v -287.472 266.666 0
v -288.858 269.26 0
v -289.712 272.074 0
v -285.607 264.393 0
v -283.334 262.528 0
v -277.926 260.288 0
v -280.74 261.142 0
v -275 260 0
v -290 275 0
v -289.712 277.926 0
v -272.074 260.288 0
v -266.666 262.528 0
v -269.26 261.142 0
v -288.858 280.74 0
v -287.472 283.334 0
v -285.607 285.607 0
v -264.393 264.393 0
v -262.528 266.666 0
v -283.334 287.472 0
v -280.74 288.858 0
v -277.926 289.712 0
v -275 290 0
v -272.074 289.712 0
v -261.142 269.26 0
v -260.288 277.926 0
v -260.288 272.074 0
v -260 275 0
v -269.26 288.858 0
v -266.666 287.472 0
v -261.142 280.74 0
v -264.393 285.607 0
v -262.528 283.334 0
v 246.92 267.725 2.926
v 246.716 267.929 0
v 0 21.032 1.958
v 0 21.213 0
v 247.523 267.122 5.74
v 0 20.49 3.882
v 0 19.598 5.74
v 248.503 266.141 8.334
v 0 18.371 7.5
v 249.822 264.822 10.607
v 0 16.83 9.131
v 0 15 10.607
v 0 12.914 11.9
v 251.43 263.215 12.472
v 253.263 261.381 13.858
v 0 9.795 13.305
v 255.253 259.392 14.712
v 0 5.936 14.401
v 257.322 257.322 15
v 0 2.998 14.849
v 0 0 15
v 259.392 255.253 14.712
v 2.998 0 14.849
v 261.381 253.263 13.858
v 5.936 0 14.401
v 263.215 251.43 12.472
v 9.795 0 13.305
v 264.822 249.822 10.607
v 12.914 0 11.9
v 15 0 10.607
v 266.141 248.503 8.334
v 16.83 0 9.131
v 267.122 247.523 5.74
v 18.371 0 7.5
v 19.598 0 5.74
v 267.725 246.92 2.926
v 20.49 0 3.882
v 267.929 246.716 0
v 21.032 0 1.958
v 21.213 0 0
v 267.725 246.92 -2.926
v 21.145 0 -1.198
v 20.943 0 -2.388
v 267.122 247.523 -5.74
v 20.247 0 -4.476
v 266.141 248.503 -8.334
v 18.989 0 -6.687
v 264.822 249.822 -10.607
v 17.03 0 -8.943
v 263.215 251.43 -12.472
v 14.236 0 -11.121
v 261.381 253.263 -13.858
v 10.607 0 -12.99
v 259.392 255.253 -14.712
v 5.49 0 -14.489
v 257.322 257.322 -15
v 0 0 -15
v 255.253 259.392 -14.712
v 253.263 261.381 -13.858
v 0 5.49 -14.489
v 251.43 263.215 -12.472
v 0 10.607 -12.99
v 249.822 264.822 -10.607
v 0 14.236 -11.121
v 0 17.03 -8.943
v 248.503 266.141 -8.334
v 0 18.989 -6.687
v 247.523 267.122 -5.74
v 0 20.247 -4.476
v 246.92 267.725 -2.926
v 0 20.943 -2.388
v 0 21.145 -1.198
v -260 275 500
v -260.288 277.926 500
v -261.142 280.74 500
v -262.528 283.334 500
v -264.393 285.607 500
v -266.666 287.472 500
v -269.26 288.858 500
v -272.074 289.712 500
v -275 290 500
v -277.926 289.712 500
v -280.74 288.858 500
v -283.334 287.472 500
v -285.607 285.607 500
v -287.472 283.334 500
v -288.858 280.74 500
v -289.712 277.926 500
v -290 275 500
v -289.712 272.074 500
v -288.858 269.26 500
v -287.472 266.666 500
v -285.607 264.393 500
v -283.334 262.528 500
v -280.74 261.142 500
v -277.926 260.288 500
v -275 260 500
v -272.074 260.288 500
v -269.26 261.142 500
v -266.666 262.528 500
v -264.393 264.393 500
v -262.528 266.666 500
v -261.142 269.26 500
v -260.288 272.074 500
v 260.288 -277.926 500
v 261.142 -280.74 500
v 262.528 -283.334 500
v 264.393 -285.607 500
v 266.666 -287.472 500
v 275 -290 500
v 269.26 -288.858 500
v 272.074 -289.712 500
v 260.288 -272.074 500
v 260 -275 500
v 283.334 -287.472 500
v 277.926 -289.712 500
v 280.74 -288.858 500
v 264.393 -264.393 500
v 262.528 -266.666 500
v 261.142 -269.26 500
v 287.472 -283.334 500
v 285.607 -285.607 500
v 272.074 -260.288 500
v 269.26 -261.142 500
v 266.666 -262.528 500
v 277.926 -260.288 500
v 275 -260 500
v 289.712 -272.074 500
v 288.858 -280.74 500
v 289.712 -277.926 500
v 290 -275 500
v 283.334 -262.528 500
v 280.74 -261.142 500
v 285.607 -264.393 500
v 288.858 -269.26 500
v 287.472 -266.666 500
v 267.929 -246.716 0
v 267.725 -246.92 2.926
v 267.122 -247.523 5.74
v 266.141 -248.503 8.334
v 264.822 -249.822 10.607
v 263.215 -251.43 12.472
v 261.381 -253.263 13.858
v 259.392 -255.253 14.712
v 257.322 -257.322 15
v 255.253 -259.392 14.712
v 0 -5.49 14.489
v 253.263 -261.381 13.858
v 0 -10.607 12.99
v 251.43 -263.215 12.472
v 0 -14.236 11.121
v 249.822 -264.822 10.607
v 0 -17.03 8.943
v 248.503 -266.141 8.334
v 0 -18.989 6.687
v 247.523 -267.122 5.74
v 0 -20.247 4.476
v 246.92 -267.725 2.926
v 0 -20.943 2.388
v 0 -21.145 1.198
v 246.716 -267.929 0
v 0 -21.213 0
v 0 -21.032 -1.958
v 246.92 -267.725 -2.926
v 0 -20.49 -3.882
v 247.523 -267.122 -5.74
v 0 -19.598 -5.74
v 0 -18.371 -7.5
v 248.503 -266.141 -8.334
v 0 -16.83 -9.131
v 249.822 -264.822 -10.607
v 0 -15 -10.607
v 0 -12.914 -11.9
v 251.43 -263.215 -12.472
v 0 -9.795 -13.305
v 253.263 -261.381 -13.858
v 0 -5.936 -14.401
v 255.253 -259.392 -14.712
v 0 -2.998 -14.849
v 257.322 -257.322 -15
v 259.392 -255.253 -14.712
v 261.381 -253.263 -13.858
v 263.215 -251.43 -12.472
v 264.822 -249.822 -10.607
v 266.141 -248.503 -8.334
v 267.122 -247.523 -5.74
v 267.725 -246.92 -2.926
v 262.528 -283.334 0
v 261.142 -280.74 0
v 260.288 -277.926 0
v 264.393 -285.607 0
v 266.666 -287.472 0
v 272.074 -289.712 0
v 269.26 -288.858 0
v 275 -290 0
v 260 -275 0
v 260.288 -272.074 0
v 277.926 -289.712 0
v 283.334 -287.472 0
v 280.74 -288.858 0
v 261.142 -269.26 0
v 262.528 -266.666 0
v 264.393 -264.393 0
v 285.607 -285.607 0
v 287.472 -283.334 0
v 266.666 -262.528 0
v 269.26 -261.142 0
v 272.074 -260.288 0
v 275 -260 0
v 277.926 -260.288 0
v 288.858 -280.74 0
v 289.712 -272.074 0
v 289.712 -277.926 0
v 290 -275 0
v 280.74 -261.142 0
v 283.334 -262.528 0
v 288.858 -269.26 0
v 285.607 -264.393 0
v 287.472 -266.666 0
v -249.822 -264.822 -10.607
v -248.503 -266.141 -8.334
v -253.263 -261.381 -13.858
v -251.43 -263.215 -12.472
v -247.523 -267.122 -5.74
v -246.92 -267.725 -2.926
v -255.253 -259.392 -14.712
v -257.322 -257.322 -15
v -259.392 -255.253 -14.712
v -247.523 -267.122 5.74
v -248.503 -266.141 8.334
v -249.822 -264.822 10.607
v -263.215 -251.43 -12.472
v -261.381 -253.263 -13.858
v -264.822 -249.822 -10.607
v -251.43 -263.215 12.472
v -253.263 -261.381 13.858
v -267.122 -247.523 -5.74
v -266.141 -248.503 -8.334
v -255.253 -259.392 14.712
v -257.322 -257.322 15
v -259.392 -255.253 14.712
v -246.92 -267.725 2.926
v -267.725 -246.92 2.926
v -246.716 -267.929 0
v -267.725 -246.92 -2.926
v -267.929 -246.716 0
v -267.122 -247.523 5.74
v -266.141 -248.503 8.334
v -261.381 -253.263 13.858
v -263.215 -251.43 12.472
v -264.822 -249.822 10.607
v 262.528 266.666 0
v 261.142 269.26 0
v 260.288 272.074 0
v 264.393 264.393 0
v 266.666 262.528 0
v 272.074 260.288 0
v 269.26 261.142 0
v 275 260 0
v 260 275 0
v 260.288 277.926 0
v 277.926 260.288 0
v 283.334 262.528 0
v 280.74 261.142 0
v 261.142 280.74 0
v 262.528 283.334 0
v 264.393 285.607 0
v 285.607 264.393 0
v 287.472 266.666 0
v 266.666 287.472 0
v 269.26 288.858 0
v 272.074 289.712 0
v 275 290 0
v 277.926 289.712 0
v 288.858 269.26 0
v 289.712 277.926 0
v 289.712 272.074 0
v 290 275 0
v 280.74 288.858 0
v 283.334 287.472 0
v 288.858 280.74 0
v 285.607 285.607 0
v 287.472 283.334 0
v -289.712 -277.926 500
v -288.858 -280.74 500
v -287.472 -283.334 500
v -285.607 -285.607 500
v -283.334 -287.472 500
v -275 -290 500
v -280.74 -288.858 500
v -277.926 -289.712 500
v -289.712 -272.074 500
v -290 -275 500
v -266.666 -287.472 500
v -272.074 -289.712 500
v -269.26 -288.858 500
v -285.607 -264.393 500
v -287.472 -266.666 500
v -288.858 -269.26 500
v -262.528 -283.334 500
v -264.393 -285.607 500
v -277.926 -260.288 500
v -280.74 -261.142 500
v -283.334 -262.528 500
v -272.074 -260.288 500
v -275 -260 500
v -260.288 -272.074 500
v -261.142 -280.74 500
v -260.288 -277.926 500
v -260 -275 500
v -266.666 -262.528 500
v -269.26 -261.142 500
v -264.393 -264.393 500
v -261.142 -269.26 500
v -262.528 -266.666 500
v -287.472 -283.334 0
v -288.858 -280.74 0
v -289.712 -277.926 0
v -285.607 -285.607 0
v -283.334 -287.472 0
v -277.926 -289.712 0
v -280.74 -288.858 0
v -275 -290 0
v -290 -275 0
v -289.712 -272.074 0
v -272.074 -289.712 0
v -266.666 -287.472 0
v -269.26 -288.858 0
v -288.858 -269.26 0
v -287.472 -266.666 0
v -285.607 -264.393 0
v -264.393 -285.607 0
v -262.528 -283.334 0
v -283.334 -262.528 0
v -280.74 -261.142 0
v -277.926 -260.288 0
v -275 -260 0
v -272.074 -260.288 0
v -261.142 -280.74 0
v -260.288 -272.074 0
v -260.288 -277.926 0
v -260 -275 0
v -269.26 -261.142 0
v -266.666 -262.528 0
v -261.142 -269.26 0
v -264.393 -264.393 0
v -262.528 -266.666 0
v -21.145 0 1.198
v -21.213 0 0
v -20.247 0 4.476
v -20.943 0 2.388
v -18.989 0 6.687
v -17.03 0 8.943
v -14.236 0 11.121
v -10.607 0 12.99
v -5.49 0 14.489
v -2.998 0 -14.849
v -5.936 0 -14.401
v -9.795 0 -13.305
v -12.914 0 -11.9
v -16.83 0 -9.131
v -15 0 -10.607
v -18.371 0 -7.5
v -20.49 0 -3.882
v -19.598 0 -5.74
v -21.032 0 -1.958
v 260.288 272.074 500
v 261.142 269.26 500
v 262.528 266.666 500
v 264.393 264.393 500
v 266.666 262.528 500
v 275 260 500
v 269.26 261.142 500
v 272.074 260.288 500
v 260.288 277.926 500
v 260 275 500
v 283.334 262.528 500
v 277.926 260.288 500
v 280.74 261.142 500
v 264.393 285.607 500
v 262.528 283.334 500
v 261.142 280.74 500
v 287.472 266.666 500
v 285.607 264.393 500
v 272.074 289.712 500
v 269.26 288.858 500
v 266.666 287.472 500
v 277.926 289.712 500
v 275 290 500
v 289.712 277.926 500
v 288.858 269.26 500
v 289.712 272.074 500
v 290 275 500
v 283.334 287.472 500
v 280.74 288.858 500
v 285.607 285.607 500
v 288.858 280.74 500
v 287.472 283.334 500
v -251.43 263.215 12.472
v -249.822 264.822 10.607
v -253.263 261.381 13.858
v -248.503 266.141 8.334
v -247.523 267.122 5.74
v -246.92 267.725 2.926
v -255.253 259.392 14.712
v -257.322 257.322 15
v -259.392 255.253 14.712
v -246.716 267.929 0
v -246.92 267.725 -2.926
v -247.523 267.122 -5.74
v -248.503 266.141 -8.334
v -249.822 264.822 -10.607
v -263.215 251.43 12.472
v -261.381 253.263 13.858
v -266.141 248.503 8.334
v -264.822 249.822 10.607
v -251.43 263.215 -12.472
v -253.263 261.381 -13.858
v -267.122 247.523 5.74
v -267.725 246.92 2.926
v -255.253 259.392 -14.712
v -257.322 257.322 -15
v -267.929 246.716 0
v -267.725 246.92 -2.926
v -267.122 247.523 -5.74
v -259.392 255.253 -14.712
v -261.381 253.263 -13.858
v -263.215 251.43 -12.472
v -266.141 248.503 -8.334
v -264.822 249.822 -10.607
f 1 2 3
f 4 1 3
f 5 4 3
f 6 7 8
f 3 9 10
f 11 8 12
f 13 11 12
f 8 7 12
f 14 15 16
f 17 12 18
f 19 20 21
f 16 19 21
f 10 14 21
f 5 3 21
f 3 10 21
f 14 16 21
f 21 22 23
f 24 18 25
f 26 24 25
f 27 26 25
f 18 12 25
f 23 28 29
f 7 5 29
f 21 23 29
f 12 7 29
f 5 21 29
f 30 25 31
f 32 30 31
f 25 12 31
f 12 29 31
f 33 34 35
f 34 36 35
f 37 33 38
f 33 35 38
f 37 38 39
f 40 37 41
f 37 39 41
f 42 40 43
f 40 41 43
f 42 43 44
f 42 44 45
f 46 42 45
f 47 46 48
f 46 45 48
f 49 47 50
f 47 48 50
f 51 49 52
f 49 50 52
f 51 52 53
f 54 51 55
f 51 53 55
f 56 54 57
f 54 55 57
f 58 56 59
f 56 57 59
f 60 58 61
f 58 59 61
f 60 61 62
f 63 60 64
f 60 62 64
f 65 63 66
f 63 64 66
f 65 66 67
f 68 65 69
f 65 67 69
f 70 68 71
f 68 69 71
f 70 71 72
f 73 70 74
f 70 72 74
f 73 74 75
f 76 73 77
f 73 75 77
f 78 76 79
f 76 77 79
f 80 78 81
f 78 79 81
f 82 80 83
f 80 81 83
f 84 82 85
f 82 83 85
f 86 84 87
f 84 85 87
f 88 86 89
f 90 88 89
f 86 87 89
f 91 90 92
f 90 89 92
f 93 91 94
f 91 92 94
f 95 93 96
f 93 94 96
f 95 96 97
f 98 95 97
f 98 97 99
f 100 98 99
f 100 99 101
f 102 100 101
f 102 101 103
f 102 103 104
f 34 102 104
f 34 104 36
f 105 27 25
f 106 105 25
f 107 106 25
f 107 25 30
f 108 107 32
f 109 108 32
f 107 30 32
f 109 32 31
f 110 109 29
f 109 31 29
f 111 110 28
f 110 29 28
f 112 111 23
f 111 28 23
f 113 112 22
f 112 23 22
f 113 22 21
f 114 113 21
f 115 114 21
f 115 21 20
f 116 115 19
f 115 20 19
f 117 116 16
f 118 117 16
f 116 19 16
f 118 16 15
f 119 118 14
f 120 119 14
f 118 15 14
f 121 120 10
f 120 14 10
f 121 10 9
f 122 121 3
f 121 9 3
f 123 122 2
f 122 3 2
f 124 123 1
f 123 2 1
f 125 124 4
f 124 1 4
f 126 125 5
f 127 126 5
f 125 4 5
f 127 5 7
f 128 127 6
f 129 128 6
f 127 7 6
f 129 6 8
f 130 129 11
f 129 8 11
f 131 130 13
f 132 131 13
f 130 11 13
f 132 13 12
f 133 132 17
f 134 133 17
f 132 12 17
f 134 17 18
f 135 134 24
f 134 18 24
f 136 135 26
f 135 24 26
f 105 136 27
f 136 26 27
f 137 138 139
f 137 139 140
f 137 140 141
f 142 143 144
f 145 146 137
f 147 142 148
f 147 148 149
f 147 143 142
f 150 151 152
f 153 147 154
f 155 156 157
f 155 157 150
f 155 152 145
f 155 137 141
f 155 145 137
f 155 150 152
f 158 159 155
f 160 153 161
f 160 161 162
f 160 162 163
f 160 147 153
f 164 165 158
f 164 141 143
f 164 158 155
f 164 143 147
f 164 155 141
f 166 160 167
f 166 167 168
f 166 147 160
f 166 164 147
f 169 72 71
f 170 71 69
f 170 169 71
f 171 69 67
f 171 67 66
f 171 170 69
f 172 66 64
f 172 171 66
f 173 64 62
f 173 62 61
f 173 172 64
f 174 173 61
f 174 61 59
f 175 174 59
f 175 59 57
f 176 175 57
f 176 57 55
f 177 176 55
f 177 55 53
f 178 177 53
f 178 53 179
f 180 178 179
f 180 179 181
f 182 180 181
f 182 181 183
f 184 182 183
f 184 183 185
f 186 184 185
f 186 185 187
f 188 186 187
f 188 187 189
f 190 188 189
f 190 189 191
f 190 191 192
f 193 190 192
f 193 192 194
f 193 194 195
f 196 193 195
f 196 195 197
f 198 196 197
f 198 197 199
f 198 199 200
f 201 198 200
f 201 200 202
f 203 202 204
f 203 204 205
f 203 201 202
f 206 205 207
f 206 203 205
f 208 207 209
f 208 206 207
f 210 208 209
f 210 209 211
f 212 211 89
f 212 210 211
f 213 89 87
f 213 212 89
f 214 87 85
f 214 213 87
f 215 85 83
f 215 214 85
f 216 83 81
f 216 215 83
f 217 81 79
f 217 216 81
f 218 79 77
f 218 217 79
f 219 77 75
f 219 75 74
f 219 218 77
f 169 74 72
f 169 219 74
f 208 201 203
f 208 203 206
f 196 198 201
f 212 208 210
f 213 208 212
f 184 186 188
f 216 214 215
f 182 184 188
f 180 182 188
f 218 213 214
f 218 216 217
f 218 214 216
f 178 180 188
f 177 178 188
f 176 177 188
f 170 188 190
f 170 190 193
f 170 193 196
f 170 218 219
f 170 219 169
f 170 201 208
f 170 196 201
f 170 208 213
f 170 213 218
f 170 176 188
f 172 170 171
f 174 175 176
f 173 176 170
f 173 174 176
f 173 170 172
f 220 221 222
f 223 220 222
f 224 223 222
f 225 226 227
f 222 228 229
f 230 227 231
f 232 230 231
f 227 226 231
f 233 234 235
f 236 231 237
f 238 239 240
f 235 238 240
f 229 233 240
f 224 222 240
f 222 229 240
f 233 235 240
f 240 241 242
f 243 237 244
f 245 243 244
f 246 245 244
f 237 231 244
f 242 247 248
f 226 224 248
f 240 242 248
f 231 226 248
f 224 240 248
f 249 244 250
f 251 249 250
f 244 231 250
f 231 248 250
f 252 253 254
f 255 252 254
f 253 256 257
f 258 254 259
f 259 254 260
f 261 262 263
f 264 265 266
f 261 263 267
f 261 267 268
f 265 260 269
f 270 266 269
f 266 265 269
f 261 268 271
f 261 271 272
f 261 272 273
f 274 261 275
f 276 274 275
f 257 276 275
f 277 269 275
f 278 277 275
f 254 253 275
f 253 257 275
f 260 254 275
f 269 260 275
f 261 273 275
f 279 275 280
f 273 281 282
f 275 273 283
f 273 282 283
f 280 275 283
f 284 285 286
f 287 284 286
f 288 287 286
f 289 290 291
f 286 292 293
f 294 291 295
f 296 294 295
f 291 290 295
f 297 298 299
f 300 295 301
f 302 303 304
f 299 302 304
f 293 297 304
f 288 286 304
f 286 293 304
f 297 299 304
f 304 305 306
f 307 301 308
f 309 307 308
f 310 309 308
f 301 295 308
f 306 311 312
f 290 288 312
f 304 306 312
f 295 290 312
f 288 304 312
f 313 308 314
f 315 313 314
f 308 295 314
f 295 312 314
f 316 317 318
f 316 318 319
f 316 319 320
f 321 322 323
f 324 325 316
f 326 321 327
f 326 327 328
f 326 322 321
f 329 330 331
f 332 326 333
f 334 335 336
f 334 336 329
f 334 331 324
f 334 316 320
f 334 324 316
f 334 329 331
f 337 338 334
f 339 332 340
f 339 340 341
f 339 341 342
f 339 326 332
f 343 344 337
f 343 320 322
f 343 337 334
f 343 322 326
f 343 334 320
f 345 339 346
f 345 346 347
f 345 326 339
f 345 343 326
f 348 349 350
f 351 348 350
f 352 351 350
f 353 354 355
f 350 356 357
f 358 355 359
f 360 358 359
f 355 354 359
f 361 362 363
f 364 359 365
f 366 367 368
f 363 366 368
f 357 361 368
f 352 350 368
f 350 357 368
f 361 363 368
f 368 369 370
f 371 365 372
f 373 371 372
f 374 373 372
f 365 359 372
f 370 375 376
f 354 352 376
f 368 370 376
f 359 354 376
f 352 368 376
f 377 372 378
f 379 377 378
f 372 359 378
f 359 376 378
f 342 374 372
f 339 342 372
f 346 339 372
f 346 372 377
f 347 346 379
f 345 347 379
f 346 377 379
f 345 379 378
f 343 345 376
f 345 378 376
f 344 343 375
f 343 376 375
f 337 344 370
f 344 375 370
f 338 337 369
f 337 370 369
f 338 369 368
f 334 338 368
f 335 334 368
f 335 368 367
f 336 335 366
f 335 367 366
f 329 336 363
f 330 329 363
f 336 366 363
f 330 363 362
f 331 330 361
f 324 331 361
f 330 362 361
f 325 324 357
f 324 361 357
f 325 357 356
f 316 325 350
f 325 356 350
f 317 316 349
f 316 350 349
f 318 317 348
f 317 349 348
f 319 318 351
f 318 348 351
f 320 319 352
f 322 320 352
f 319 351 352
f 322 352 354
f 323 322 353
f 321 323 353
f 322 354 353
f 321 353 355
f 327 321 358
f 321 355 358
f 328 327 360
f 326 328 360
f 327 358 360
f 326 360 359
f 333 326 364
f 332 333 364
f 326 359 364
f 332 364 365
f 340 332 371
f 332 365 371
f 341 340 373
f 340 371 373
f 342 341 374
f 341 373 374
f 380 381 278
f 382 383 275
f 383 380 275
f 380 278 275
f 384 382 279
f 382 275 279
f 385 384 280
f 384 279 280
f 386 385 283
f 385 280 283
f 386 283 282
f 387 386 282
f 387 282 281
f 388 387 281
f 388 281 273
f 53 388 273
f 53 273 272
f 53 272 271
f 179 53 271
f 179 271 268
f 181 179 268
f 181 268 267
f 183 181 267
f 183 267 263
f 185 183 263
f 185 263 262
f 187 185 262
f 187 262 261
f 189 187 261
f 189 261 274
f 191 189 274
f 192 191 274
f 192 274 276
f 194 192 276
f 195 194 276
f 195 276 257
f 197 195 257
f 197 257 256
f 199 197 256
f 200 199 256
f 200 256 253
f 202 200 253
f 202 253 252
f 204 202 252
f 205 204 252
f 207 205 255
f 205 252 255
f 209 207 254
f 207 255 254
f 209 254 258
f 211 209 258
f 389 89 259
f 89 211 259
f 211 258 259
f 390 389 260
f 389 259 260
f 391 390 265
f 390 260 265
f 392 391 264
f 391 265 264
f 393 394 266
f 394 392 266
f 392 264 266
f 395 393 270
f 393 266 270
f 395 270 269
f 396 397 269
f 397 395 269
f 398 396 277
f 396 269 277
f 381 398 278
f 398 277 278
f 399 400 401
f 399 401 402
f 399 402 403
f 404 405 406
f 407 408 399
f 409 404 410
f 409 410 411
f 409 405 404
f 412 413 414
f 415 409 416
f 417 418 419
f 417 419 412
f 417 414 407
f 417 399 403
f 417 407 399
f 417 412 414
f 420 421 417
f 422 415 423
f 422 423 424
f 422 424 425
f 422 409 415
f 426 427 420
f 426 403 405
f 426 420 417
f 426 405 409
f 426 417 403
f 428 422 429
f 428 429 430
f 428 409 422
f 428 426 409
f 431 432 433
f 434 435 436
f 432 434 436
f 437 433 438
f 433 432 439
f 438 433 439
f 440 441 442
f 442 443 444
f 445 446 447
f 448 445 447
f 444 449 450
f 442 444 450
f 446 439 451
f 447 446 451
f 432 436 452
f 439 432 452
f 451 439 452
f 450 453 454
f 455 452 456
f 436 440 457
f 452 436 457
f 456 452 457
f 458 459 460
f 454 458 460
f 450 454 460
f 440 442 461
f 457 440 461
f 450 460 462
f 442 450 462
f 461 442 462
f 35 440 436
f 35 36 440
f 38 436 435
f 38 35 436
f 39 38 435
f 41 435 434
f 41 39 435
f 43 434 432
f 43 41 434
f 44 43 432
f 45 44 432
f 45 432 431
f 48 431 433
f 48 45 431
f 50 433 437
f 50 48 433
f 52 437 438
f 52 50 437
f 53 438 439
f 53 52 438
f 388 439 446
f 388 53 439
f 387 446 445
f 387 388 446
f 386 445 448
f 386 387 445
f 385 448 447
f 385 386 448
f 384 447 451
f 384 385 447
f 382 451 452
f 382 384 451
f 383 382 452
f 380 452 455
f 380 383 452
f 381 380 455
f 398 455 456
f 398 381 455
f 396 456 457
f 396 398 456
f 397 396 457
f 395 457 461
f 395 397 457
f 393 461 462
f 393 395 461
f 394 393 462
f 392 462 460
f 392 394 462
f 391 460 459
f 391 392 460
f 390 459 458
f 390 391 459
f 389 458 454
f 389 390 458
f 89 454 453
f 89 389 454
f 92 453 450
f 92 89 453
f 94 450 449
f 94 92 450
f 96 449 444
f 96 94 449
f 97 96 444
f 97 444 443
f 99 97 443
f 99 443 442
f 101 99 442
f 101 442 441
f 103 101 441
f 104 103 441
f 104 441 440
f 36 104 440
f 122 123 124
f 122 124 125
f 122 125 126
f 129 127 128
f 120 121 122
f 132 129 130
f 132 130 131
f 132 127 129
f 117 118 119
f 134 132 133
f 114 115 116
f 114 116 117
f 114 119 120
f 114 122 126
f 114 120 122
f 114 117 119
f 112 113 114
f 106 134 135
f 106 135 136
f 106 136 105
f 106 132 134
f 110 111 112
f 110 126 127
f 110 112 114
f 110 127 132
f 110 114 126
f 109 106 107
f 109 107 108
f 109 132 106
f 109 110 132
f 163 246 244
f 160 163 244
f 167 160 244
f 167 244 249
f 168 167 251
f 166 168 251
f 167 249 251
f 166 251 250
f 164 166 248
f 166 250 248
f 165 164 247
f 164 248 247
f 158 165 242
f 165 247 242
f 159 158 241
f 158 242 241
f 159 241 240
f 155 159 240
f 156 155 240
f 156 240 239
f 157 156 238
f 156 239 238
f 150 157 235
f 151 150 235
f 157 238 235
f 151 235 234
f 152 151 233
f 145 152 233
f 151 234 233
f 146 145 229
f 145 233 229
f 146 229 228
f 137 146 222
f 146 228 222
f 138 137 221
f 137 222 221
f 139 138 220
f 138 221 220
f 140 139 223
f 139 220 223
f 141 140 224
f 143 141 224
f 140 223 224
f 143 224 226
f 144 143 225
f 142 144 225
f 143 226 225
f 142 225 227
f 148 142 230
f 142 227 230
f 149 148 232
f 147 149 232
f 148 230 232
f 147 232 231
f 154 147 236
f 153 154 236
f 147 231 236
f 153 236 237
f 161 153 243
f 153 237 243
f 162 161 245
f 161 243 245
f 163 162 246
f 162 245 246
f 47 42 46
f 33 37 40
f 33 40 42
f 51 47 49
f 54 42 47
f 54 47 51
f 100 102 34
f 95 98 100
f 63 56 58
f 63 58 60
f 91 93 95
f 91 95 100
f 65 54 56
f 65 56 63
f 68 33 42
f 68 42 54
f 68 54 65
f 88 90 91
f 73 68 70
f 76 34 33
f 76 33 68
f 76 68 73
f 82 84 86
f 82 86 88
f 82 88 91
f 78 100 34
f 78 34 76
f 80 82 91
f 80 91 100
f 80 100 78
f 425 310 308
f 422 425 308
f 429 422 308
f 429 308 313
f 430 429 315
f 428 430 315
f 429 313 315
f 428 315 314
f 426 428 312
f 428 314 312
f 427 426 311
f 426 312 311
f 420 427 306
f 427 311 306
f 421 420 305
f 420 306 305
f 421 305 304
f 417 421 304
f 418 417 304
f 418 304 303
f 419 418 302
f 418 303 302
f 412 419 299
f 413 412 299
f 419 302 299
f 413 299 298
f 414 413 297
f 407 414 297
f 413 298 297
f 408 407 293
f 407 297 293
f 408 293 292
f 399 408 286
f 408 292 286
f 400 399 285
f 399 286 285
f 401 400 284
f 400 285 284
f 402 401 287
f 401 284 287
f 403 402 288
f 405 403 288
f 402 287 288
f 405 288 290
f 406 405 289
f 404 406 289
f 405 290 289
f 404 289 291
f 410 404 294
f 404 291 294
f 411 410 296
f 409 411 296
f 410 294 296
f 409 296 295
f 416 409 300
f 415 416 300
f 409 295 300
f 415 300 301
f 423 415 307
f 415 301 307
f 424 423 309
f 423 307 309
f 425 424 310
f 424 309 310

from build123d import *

# Parameters (mm, degrees)
F1_R     = 15
F2_DEPTH = 500
F4_R     = 15


with BuildPart() as f2:
    # F1 (on Top) → F2 (new body)
    with BuildSketch(Plane.XY):
        with Locations((-275, 275)):
            Circle(F1_R)
    extrude(amount=F2_DEPTH)


with BuildPart() as f2b:
    # F1 (on Top) → F2, piece 2 (new body)
    with BuildSketch(Plane.XY):
        with Locations((275, 275)):
            Circle(F1_R)
    extrude(amount=F2_DEPTH)


with BuildPart() as f2c:
    # F1 (on Top) → F2, piece 3 (new body)
    with BuildSketch(Plane.XY):
        with Locations((-275, -275)):
            Circle(F1_R)
    extrude(amount=F2_DEPTH)


with BuildPart() as f2d:
    # F1 (on Top) → F2, piece 4 (new body)
    with BuildSketch(Plane.XY):
        with Locations((275, -275)):
            Circle(F1_R)
    extrude(amount=F2_DEPTH)


with BuildPart() as f5:
    # F5: sweep along a path in F1
    with BuildLine(Plane.XY) as f5_path:
        Line((-257.3223304703, 257.3223304703), (257.3223304703, -257.3223304703))
    # F4 (on line) → F5 (sweep)
    with BuildSketch(Plane(origin=(-257.3223304703, 257.3223304703, 0), x_dir=(0.7071067812, 0.7071067812, 0), z_dir=(0.7071067812, -0.7071067812, 0))):
        Circle(F4_R)
    sweep(path=f5_path.line)

    # F6: F5 across plane


with BuildPart() as f5_1:
    add(f5.part)
    add(f5.part.mirror(Plane.YZ))


solid = Compound([f2.part, f2b.part, f2c.part, f2d.part, f5_1.part])
